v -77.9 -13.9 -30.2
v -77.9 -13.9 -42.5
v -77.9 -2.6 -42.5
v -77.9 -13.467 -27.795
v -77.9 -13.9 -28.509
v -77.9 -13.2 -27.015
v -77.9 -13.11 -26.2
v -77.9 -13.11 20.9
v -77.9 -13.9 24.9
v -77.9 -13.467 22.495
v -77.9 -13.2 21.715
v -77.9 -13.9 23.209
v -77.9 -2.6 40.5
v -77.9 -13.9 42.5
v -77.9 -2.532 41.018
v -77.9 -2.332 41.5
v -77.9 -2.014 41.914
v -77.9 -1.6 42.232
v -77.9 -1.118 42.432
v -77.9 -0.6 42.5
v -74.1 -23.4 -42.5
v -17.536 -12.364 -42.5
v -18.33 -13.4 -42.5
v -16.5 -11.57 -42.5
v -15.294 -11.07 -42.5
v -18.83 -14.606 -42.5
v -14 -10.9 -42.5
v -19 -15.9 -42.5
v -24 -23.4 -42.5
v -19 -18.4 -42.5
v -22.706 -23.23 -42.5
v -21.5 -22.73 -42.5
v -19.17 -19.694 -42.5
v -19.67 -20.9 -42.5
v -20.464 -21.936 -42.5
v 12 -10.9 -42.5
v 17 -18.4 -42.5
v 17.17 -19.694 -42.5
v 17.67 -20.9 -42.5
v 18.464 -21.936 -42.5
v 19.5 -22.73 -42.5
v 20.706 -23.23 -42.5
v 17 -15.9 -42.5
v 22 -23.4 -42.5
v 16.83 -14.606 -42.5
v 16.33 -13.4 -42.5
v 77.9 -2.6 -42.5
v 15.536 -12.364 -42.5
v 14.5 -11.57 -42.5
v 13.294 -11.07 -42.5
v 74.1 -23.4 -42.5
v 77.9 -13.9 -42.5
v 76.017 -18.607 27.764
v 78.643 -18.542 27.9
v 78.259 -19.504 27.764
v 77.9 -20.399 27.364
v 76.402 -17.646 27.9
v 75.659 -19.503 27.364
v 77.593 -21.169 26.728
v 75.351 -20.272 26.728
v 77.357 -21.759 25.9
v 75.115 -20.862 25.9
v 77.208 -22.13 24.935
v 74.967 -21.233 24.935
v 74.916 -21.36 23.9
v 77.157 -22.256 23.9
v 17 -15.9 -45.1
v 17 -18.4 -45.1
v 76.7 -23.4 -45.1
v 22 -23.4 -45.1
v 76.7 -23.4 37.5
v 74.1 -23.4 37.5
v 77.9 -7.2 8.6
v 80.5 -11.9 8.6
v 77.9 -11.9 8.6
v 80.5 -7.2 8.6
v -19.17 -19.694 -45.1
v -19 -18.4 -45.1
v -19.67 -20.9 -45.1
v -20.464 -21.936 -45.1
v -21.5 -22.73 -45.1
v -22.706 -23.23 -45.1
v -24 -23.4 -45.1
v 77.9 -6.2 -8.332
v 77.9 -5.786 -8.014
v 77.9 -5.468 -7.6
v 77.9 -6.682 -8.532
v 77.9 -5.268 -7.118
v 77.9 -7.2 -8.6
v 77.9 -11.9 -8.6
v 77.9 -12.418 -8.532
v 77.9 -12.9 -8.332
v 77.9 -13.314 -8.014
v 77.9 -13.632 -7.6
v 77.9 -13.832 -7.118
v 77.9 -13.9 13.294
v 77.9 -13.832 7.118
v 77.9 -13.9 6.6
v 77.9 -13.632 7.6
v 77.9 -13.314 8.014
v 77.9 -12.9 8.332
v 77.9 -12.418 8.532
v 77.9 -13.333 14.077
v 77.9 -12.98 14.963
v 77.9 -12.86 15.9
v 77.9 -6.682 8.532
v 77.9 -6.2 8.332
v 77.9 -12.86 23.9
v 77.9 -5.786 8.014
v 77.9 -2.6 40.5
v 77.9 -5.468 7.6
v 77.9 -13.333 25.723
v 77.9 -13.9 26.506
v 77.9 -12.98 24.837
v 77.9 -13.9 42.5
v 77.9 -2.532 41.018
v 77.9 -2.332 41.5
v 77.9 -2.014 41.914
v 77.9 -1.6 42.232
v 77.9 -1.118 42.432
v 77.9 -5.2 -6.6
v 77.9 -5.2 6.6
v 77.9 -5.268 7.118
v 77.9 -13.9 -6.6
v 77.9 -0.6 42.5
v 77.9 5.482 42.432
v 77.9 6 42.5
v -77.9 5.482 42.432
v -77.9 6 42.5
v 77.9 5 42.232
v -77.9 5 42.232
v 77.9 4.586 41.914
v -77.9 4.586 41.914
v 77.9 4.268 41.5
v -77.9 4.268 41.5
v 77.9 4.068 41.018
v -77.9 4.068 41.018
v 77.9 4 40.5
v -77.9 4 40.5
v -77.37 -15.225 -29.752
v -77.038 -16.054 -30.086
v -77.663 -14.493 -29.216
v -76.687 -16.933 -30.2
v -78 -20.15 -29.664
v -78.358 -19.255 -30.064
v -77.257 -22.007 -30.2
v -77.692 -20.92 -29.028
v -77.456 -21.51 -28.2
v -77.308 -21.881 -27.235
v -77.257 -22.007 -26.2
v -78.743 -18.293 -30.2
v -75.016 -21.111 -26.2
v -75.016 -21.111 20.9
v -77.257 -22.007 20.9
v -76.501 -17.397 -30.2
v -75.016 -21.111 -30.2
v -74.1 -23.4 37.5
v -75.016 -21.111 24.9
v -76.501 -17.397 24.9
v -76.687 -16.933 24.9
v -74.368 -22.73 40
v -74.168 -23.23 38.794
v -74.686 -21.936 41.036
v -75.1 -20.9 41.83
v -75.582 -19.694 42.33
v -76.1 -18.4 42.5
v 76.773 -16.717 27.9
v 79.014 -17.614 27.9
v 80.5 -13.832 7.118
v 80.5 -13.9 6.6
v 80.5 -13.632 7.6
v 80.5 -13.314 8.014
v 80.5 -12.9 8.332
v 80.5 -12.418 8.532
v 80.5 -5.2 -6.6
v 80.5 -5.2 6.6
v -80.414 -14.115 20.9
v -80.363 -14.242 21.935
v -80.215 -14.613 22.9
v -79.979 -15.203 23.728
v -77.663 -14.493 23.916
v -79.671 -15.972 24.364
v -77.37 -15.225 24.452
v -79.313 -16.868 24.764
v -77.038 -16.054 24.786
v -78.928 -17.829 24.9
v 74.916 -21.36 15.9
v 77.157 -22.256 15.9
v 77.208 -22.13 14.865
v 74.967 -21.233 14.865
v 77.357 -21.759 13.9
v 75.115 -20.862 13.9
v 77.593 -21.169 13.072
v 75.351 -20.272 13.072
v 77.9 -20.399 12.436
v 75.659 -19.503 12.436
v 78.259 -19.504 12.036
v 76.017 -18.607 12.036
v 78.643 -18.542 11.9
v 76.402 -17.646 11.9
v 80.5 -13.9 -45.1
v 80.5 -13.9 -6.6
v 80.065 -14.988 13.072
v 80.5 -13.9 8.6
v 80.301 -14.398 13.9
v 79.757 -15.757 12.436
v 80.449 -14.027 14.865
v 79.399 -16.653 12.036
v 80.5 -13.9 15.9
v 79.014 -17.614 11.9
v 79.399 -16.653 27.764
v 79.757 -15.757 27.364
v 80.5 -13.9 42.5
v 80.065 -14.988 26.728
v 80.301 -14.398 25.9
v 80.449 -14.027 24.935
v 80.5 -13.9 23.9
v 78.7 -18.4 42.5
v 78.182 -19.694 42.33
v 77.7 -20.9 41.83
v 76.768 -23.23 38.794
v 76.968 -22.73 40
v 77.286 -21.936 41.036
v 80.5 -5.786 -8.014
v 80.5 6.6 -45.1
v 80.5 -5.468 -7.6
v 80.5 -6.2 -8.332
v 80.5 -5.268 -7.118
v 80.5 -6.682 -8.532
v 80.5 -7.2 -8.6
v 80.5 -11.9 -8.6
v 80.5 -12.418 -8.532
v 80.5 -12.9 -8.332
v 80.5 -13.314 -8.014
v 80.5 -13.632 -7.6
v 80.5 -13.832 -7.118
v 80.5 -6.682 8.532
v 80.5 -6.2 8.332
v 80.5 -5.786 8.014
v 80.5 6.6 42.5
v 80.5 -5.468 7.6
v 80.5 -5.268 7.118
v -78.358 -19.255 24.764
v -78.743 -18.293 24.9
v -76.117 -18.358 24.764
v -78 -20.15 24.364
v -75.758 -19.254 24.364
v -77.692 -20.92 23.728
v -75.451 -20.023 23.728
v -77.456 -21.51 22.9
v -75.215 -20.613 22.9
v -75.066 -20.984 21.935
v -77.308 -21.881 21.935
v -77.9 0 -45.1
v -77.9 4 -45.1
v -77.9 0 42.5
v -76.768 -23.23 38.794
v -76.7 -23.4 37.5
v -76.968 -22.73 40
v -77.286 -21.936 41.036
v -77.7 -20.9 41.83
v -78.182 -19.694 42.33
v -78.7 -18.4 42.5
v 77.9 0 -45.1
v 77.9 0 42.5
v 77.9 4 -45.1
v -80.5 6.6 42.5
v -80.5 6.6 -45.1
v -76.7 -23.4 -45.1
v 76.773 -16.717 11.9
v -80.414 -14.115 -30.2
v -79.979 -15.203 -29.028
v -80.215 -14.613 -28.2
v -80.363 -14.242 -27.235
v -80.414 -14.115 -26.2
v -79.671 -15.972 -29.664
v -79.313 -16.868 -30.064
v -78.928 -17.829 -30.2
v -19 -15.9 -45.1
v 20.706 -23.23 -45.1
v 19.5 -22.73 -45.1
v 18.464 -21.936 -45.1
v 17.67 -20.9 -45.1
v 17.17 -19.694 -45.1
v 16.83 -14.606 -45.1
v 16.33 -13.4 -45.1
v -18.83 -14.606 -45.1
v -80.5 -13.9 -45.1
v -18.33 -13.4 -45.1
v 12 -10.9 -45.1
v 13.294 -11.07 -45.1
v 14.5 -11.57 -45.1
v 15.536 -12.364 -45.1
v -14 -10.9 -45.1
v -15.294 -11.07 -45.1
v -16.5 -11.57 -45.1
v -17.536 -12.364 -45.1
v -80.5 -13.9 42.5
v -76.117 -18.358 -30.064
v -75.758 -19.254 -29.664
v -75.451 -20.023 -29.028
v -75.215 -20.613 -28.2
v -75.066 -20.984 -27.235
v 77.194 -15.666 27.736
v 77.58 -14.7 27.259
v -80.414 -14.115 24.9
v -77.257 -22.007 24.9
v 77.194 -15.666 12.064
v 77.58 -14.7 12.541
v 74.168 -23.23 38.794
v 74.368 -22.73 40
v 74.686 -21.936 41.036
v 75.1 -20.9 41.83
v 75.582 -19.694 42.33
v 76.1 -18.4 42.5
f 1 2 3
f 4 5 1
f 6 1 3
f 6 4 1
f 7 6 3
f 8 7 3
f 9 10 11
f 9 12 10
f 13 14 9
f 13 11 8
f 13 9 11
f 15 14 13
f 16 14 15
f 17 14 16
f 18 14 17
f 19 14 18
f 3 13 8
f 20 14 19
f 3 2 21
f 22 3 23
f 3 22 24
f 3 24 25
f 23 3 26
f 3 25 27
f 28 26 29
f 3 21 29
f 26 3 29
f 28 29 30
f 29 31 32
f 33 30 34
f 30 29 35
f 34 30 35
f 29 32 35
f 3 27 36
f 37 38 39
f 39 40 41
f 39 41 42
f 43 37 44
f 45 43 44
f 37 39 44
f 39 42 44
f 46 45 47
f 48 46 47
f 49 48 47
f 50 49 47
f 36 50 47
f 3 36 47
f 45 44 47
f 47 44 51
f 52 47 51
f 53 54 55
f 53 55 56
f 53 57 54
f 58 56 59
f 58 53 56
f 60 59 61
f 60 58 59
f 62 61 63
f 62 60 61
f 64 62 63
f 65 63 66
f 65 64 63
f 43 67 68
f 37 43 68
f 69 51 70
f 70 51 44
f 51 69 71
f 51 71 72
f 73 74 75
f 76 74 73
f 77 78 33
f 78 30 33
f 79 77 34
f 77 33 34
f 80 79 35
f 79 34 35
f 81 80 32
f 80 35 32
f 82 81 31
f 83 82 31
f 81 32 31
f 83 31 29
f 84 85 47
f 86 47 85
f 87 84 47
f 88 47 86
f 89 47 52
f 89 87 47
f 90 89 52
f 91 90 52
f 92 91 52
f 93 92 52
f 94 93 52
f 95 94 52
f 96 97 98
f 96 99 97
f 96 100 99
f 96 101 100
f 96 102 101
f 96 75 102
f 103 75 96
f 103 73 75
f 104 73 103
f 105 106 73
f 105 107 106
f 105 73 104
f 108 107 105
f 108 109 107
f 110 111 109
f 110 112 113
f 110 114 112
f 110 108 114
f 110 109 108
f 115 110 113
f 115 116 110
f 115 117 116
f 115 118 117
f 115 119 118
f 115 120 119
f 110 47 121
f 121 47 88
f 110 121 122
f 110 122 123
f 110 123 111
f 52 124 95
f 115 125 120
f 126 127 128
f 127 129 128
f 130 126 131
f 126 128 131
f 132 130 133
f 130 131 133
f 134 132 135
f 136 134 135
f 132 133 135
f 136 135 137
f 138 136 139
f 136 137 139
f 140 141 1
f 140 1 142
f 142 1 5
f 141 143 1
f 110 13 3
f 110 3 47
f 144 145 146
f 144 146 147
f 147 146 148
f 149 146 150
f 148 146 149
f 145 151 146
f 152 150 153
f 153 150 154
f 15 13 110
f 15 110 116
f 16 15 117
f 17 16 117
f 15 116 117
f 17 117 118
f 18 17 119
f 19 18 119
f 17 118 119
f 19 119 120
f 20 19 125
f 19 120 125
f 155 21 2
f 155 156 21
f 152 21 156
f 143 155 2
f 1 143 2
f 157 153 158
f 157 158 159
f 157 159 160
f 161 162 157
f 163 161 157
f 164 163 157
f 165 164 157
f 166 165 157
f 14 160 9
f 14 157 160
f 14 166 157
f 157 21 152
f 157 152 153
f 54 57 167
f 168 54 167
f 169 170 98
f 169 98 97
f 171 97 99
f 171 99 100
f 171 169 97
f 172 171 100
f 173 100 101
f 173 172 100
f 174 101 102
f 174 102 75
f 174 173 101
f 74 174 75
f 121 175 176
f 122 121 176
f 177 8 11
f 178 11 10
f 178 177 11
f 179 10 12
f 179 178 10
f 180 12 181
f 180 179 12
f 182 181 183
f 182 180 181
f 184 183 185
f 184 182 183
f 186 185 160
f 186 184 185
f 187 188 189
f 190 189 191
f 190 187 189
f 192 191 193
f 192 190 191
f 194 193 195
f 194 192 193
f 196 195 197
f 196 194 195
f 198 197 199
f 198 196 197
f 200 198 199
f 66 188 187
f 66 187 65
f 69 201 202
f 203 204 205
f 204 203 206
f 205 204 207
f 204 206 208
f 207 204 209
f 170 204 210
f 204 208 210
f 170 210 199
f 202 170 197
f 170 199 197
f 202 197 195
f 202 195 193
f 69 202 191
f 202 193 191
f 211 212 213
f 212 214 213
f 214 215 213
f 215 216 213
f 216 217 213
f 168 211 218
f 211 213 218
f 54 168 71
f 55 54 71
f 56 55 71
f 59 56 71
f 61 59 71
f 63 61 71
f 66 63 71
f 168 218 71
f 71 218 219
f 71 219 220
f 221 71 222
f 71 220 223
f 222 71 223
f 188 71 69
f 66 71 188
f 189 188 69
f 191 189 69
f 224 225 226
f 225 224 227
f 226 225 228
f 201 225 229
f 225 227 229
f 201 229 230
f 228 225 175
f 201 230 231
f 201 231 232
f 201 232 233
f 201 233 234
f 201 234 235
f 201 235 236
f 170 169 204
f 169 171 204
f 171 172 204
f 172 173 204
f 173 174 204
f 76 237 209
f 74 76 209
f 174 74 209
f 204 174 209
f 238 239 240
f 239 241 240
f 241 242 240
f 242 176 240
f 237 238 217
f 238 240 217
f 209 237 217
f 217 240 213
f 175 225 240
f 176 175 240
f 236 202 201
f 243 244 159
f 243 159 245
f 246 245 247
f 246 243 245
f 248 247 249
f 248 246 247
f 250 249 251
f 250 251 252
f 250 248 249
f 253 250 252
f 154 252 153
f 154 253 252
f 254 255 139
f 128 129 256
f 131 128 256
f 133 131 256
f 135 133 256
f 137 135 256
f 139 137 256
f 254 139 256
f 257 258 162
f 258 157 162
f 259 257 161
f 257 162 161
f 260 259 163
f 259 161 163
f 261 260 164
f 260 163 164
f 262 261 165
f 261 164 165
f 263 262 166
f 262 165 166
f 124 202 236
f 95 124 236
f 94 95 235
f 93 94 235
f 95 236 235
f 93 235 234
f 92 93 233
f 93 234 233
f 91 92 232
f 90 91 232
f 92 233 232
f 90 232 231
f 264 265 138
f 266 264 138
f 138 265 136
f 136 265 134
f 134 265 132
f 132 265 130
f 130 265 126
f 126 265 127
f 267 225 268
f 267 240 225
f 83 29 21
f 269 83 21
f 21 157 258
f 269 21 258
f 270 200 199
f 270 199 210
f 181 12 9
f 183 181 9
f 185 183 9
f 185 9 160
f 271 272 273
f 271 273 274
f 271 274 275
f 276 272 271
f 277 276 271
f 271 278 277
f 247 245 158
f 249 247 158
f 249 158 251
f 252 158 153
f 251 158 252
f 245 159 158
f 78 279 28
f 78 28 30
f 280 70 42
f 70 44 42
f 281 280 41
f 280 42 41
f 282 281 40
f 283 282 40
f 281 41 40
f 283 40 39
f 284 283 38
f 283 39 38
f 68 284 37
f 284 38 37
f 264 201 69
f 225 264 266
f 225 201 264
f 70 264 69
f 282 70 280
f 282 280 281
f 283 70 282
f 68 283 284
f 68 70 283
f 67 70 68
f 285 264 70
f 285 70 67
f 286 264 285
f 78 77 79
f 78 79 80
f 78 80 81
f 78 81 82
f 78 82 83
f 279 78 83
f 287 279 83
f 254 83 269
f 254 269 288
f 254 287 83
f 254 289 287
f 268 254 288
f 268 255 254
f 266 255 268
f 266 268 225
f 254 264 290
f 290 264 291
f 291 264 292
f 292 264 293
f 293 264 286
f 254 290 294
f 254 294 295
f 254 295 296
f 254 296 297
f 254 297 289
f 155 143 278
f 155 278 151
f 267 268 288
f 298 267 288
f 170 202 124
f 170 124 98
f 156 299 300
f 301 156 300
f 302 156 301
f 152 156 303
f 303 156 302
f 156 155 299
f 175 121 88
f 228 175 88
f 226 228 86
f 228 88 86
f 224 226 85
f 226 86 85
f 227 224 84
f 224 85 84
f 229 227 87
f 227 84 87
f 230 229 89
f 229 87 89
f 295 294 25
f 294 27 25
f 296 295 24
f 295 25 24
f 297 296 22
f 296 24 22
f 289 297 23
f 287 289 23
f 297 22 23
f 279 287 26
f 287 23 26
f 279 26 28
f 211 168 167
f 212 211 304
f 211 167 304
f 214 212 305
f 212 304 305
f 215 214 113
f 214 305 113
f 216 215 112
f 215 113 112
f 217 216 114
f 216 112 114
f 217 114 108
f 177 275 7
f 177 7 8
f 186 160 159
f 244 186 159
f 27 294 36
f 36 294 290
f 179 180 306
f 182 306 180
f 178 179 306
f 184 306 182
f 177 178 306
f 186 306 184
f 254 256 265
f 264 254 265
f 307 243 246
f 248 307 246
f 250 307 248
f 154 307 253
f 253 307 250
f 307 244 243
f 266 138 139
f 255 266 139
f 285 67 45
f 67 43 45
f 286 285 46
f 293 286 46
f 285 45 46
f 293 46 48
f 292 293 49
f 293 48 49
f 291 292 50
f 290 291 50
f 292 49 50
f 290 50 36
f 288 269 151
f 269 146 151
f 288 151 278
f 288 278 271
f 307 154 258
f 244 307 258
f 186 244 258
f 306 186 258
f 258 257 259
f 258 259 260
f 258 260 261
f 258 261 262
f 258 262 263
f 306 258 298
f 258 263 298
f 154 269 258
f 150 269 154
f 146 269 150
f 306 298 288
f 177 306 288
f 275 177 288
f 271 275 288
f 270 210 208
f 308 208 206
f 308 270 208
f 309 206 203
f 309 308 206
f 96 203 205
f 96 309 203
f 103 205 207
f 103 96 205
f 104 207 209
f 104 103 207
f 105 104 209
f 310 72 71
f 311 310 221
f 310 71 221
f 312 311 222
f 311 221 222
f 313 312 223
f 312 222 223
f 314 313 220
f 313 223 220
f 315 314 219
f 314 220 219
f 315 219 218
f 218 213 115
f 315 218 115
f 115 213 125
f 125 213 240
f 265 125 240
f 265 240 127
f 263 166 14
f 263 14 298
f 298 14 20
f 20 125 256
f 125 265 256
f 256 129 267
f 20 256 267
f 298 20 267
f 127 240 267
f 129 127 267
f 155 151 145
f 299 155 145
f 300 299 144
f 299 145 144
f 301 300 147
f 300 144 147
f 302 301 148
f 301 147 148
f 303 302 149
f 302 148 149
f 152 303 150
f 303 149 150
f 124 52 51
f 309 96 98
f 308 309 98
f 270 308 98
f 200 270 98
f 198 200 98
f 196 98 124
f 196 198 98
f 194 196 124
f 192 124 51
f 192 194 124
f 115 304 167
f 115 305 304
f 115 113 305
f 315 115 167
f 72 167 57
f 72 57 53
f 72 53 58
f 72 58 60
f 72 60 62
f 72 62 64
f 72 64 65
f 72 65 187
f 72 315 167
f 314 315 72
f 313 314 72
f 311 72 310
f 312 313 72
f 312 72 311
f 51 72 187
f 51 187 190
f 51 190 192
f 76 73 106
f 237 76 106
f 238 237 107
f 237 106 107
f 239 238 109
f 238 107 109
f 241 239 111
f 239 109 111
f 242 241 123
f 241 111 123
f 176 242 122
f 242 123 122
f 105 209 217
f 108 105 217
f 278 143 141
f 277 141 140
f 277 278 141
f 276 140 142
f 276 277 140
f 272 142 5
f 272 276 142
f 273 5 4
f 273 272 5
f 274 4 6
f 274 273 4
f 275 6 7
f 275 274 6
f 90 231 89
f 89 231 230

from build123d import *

# Parameters (mm, degrees)
F0_W          = 155.8
F0_H          = 85
F1_DEPTH      = 2.6
F3_DEPTH      = 85
F5_DEPTH      = 2.6
F6_W          = 8.7
F6_H          = 17.2
F7_DEPTH      = 25
F8_W          = 9
F8_H          = 16
F9_DEPTH      = 25
F10_W         = 8.5
F10_H         = 55.1
F11_DEPTH     = 25
F12_W         = 6.6
F12_H         = 87.6
F13_DEPTH     = 2.6
F14_W         = 6.6
F14_H         = 87.6
F15_DEPTH     = 2.6
F16_W         = 155.8
F16_H         = 87.6
F17_DEPTH     = 2.6
F19_W         = 36
F19_H         = 12.5
F20_DEPTH     = 25
F21_T1_DEPTH  = 2.4140393963
F21_T6_DEPTH  = 12.7075604463
F21_T12_DEPTH = 12.7075604463
F21_T18_DEPTH = 12.7075604463
F21_T24_DEPTH = 12.7075604463
F21_T30_DEPTH = 12.7075604463
F21_T36_DEPTH = 12.7075604463
F22_R         = 4
F23_T1_DEPTH  = 2.6
F23_T6_DEPTH  = 2.6
F23_T12_DEPTH = 2.6
F23_T17_DEPTH = 2.6
F23_T23_DEPTH = 2.6
F24_R         = 5
F25_R         = 2
F26_R         = 5


# Not quite as in the source:
# - a fillet or chamfer that OpenCascade refuses, or shapes differently, is made with other operations: its cross-section is extruded or revolved along the edge and cut away or added


with BuildPart() as f1:
    # F0 (on Front) → F1 (new body)
    with BuildSketch(Plane.XZ):
        Rectangle(F0_W, F0_H)
    extrude(amount=F1_DEPTH)

    # F2 (on face) → F3 (join)
    with BuildSketch(Plane.XY.offset(42.5)):
        Polygon((-77.9, -13.9), (-77.9, -2.6), (-77.9, 0), (-80.5, 0), (-80.5, -13.9), align=None)
        Polygon((-74.1, -23.4), (-77.9, -13.9), (-80.5, -13.9), (-76.7, -23.4), align=None)
        Polygon((77.9, 0), (77.9, -2.6), (77.9, -13.9), (74.1, -23.4), (76.7, -23.4), (80.5, -13.9), (80.5, 0), align=None)
    extrude(amount=-F3_DEPTH)

    # F4 (on face) → F5 (join)
    with BuildSketch(Plane(origin=(0, 0, -42.5), x_dir=(1, 0, 0), z_dir=(0, 0, -1))):
        Polygon((74.1, 23.4), (-74.1, 23.4), (-77.9, 13.9), (-77.9, 2.6), (77.9, 2.6), (77.9, 13.9), align=None)
        Polygon((-77.9, 13.9), (-74.1, 23.4), (-76.7, 23.4), (-80.5, 13.9), (-80.5, 0), (80.5, 0), (80.5, 13.9), (76.7, 23.4), (74.1, 23.4), (77.9, 13.9), (77.9, 2.6), (-77.9, 2.6), align=None)
    extrude(amount=F5_DEPTH)

    # F6 (on face) → F7 (cut)
    with BuildSketch(Plane.YZ.offset(80.5)):
        with Locations((-9.55, 0)):
            Rectangle(F6_W, F6_H)
    extrude(amount=-F7_DEPTH, mode=Mode.SUBTRACT)

    # F8 (on face) → F9 (cut)
    with BuildSketch(Plane(origin=(74.1896551724, -29.675862069, 0), x_dir=(0.3713906764, 0.9284766909, 0), z_dir=(0.9284766909, -0.3713906764, 0))):
        with Locations((12.4911234432, 19.9)):
            Rectangle(F8_W, F8_H)
    extrude(amount=-F9_DEPTH, mode=Mode.SUBTRACT)

    # F10 (on face) → F11 (cut)
    with BuildSketch(Plane(origin=(-74.1896551724, -29.675862069, 0), x_dir=(0.3713906764, -0.9284766909, 0), z_dir=(-0.9284766909, -0.3713906764, 0))):
        with Locations((-12.5093103096, -2.65)):
            Rectangle(F10_W, F10_H)
    extrude(amount=-F11_DEPTH, mode=Mode.SUBTRACT)

    # F12 (on face) → F13 (join)
    with BuildSketch(Plane(origin=(-80.5, 0, 0), x_dir=(0, -1, 0), z_dir=(-1, 0, 0))):
        with Locations((-3.3, -1.3)):
            Rectangle(F12_W, F12_H)
    extrude(amount=-F13_DEPTH)

    # F14 (on face) → F15 (join)
    with BuildSketch(Plane.YZ.offset(80.5)):
        with Locations((3.3, -1.3)):
            Rectangle(F14_W, F14_H)
    extrude(amount=-F15_DEPTH)

    # F16 (on face) → F17 (join)
    with BuildSketch(Plane(origin=(0, 6.6, 0), x_dir=(-1, 0, 0), z_dir=(0, 1, 0))):
        with Locations((0, -1.3)):
            Rectangle(F16_W, F16_H)
    extrude(amount=-F17_DEPTH)

    # F18: union 

    # F19 (on face) → F20 (cut)
    with BuildSketch(Plane(origin=(0, 0, -45.1), x_dir=(1, 0, 0), z_dir=(0, 0, -1))):
        with Locations((-1, 17.15)):
            Rectangle(F19_W, F19_H)
    extrude(amount=-F20_DEPTH, mode=Mode.SUBTRACT)

    # F21: fillet of radius 4 on 4 edges, made by hand

    # F21_s2 → F21_t1 (join)
    with BuildSketch(Plane(origin=(-74.1896551724, -29.675862069, 0), x_dir=(0, 0, 1), z_dir=(0.9284766909, 0.3713906764, 0))):
        with BuildLine():
            ThreePointArc((-30.2, -12.2593103096), (-29.0284271247, -9.4308831849), (-26.2, -8.2593103096))
            Line((-26.2, -8.2593103096), (-30.2, -8.2593103096))
            Line((-30.2, -8.2593103096), (-30.2, -12.2593103096))
        make_face()
        with BuildLine():
            ThreePointArc((24.9, -12.2593103096), (23.7284271247, -9.4308831849), (20.9, -8.2593103096))
            Line((20.9, -8.2593103096), (24.9, -8.2593103096))
            Line((24.9, -8.2593103096), (24.9, -12.2593103096))
        make_face()
    extrude(amount=F21_T1_DEPTH)


with BuildPart() as f21_tool4:
    # F21_s5 → F21_t6 (new body)
    with BuildSketch(Plane(origin=(-74.1896551724, -29.675862069, 0), x_dir=(0, 0, 1), z_dir=(0.9284766909, 0.3713906764, 0))):
        with BuildLine():
            ThreePointArc((-30.2, -12.7593103096), (-29.0284271247, -15.5877374344), (-26.2, -16.7593103096))
            Line((-26.2, -16.7593103096), (-30.2, -16.7593103096))
            Line((-30.2, -16.7593103096), (-30.2, -12.7593103096))
        make_face()
    extrude(amount=F21_T6_DEPTH)

    split(bisect_by=Plane.YZ.offset(-77.9), keep=Keep.BOTTOM)

    split(bisect_by=Plane(origin=(-71.9482758621, -28.7793103448, 0), x_dir=(0, 0, 1), z_dir=(-0.9284766909, -0.3713906764, 0)), keep=Keep.TOP)


with BuildPart() as f1_1:
    add(f1.part)

    # F21_t3: union F21_tool4
    add(f21_tool4.part)


with BuildPart() as f21_tool10:
    # F21_s11 → F21_t12 (new body)
    with BuildSketch(Plane(origin=(-74.1896551724, -29.675862069, 0), x_dir=(0, 0, 1), z_dir=(0.9284766909, 0.3713906764, 0))):
        with BuildLine():
            ThreePointArc((-30.2, -12.7593103096), (-29.0284271247, -15.5877374344), (-26.2, -16.7593103096))
            Line((-26.2, -16.7593103096), (-30.2, -16.7593103096))
            Line((-30.2, -16.7593103096), (-30.2, -12.7593103096))
        make_face()
    extrude(amount=F21_T12_DEPTH)

    split(bisect_by=Plane.YZ.offset(-77.9), keep=Keep.BOTTOM)

    split(bisect_by=Plane(origin=(-71.9482758621, -28.7793103448, 0), x_dir=(0, 0, 1), z_dir=(0.9284766909, 0.3713906764, 0)), keep=Keep.TOP)


with BuildPart() as f1_2:
    add(f1_1.part)

    # F21_t9: union F21_tool10
    add(f21_tool10.part)


with BuildPart() as f21_tool16:
    # F21_s17 → F21_t18 (new body)
    with BuildSketch(Plane(origin=(-74.1896551724, -29.675862069, 0), x_dir=(0, 0, 1), z_dir=(0.9284766909, 0.3713906764, 0))):
        with BuildLine():
            ThreePointArc((-30.2, -12.7593103096), (-29.0284271247, -15.5877374344), (-26.2, -16.7593103096))
            Line((-26.2, -16.7593103096), (-30.2, -16.7593103096))
            Line((-30.2, -16.7593103096), (-30.2, -12.7593103096))
        make_face()
    extrude(amount=F21_T18_DEPTH)

    split(bisect_by=Plane.YZ.offset(-77.9), keep=Keep.TOP)

    split(bisect_by=Plane(origin=(-71.9482758621, -28.7793103448, 0), x_dir=(0, 0, 1), z_dir=(-0.9284766909, -0.3713906764, 0)), keep=Keep.TOP)


with BuildPart() as f1_3:
    add(f1_2.part)

    # F21_t15: union F21_tool16
    add(f21_tool16.part)


with BuildPart() as f21_tool22:
    # F21_s23 → F21_t24 (new body)
    with BuildSketch(Plane(origin=(-74.1896551724, -29.675862069, 0), x_dir=(0, 0, 1), z_dir=(0.9284766909, 0.3713906764, 0))):
        with BuildLine():
            ThreePointArc((20.9, -16.7593103096), (23.7284271247, -15.5877374344), (24.9, -12.7593103096))
            Line((24.9, -12.7593103096), (24.9, -16.7593103096))
            Line((24.9, -16.7593103096), (20.9, -16.7593103096))
        make_face()
    extrude(amount=F21_T24_DEPTH)

    split(bisect_by=Plane.YZ.offset(-77.9), keep=Keep.BOTTOM)

    split(bisect_by=Plane(origin=(-71.9482758621, -28.7793103448, 0), x_dir=(0, 0, 1), z_dir=(-0.9284766909, -0.3713906764, 0)), keep=Keep.TOP)


with BuildPart() as f1_4:
    add(f1_3.part)

    # F21_t21: union F21_tool22
    add(f21_tool22.part)


with BuildPart() as f21_tool28:
    # F21_s29 → F21_t30 (new body)
    with BuildSketch(Plane(origin=(-74.1896551724, -29.675862069, 0), x_dir=(0, 0, 1), z_dir=(0.9284766909, 0.3713906764, 0))):
        with BuildLine():
            ThreePointArc((20.9, -16.7593103096), (23.7284271247, -15.5877374344), (24.9, -12.7593103096))
            Line((24.9, -12.7593103096), (24.9, -16.7593103096))
            Line((24.9, -16.7593103096), (20.9, -16.7593103096))
        make_face()
    extrude(amount=F21_T30_DEPTH)

    split(bisect_by=Plane.YZ.offset(-77.9), keep=Keep.TOP)

    split(bisect_by=Plane(origin=(-71.9482758621, -28.7793103448, 0), x_dir=(0, 0, 1), z_dir=(-0.9284766909, -0.3713906764, 0)), keep=Keep.TOP)


with BuildPart() as f1_5:
    add(f1_4.part)

    # F21_t27: union F21_tool28
    add(f21_tool28.part)


with BuildPart() as f21_tool34:
    # F21_s35 → F21_t36 (new body)
    with BuildSketch(Plane(origin=(-74.1896551724, -29.675862069, 0), x_dir=(0, 0, 1), z_dir=(0.9284766909, 0.3713906764, 0))):
        with BuildLine():
            ThreePointArc((20.9, -16.7593103096), (23.7284271247, -15.5877374344), (24.9, -12.7593103096))
            Line((24.9, -12.7593103096), (24.9, -16.7593103096))
            Line((24.9, -16.7593103096), (20.9, -16.7593103096))
        make_face()
    extrude(amount=F21_T36_DEPTH)

    split(bisect_by=Plane.YZ.offset(-77.9), keep=Keep.BOTTOM)

    split(bisect_by=Plane(origin=(-71.9482758621, -28.7793103448, 0), x_dir=(0, 0, 1), z_dir=(0.9284766909, 0.3713906764, 0)), keep=Keep.TOP)


with BuildPart() as f1_6:
    add(f1_5.part)

    # F21_t33: union F21_tool34
    add(f21_tool34.part)

    # F22 (call 1 of 4: OpenCascade refuses the feature's edges together)
    f22_edges = [f1_6.edges().sort_by_distance(p)[0] for p in [
        (76.036794, -21.808014, 11.9),
    ]]
    fillet(f22_edges, radius=F22_R)

    # F22#2 (call 2 of 4)
    f22_2_edges = [f1_6.edges().sort_by_distance(p)[0] for p in [
        (79.2, -13.38, 11.9),
    ]]
    fillet(f22_2_edges, radius=F22_R)

    # F22#3 (call 3 of 4)
    f22_3_edges = [f1_6.edges().sort_by_distance(p)[0] for p in [
        (76.036794, -21.808014, 27.9),
    ]]
    fillet(f22_3_edges, radius=F22_R)

    # F22#4 (call 4 of 4)
    f22_4_edges = [f1_6.edges().sort_by_distance(p)[0] for p in [
        (79.2, -13.38, 27.9),
    ]]
    fillet(f22_4_edges, radius=F22_R)

    # F23: fillet of radius 2 on 4 edges, made by hand

    # F23_s2 → F23_t1 (join)
    with BuildSketch(Plane.YZ.offset(77.9)):
        with BuildLine():
            ThreePointArc((-7.2, 8.6), (-5.7857864376, 8.0142135624), (-5.2, 6.6))
            Line((-5.2, 6.6), (-5.2, 8.6))
            Line((-5.2, 8.6), (-7.2, 8.6))
        make_face()
        with BuildLine():
            ThreePointArc((-5.2, -6.6), (-5.7857864376, -8.0142135624), (-7.2, -8.6))
            Line((-7.2, -8.6), (-5.2, -8.6))
            Line((-5.2, -8.6), (-5.2, -6.6))
        make_face()
    extrude(amount=F23_T1_DEPTH)


with BuildPart() as f23_tool4:
    # F23_s5 → F23_t6 (new body)
    with BuildSketch(Plane.YZ.offset(80.5)):
        with BuildLine():
            ThreePointArc((-13.9, 6.6), (-13.3142135624, 8.0142135624), (-11.9, 8.6))
            Line((-11.9, 8.6), (-13.9, 8.6))
            Line((-13.9, 8.6), (-13.9, 6.6))
        make_face()
    extrude(amount=-F23_T6_DEPTH)

    split(bisect_by=Plane(origin=(74.1896551724, -29.675862069, 0), x_dir=(0, 0, 1), z_dir=(-0.9284766909, 0.3713906764, 0)), keep=Keep.TOP)

    split(bisect_by=Plane(origin=(71.9482758621, -28.7793103448, 0), x_dir=(0, 0, 1), z_dir=(0.9284766909, -0.3713906764, 0)), keep=Keep.TOP)


with BuildPart() as f1_7:
    add(f1_6.part)

    # F23_t3: union F23_tool4
    add(f23_tool4.part)


with BuildPart() as f23_tool10:
    # F23_s11 → F23_t12 (new body)
    with BuildSketch(Plane.YZ.offset(80.5)):
        with BuildLine():
            ThreePointArc((-13.9, 6.6), (-13.3142135624, 8.0142135624), (-11.9, 8.6))
            Line((-11.9, 8.6), (-13.9, 8.6))
            Line((-13.9, 8.6), (-13.9, 6.6))
        make_face()
    extrude(amount=-F23_T12_DEPTH)

    split(bisect_by=Plane(origin=(71.9482758621, -28.7793103448, 0), x_dir=(0, 0, 1), z_dir=(-0.9284766909, 0.3713906764, 0)), keep=Keep.TOP)


with BuildPart() as f1_8:
    add(f1_7.part)

    # F23_t9: union F23_tool10
    add(f23_tool10.part)


with BuildPart() as f23_tool15:
    # F23_s16 → F23_t17 (new body)
    with BuildSketch(Plane.YZ.offset(80.5)):
        with BuildLine():
            ThreePointArc((-13.9, -6.6), (-13.3142135624, -8.0142135624), (-11.9, -8.6))
            Line((-11.9, -8.6), (-13.9, -8.6))
            Line((-13.9, -8.6), (-13.9, -6.6))
        make_face()
    extrude(amount=-F23_T17_DEPTH)

    split(bisect_by=Plane(origin=(74.1896551724, -29.675862069, 0), x_dir=(0, 0, 1), z_dir=(-0.9284766909, 0.3713906764, 0)), keep=Keep.TOP)

    split(bisect_by=Plane(origin=(71.9482758621, -28.7793103448, 0), x_dir=(0, 0, 1), z_dir=(0.9284766909, -0.3713906764, 0)), keep=Keep.TOP)


with BuildPart() as f1_9:
    add(f1_8.part)

    # F23_t14: union F23_tool15
    add(f23_tool15.part)


with BuildPart() as f23_tool21:
    # F23_s22 → F23_t23 (new body)
    with BuildSketch(Plane.YZ.offset(80.5)):
        with BuildLine():
            ThreePointArc((-13.9, -6.6), (-13.3142135624, -8.0142135624), (-11.9, -8.6))
            Line((-11.9, -8.6), (-13.9, -8.6))
            Line((-13.9, -8.6), (-13.9, -6.6))
        make_face()
    extrude(amount=-F23_T23_DEPTH)

    split(bisect_by=Plane(origin=(71.9482758621, -28.7793103448, 0), x_dir=(0, 0, 1), z_dir=(-0.9284766909, 0.3713906764, 0)), keep=Keep.TOP)


with BuildPart() as f1_10:
    add(f1_9.part)

    # F23_t20: union F23_tool21
    add(f23_tool21.part)

    # F24
    f24_edges = [f1_10.edges().sort_by_distance(p)[0] for p in [
        (17, -10.9, -43.8),
        (-19, -10.9, -43.8),
        (17, -23.4, -43.8),
        (-19, -23.4, -43.8),
    ]]
    fillet(f24_edges, radius=F24_R)

    # F25
    f25_edges = [f1_10.edges().sort_by_distance(p)[0] for p in [
        (0, -2.6, 42.5),
        (0, 4, 42.5),
    ]]
    fillet(f25_edges, radius=F25_R)

    # F26
    f26_edges = [f1_10.edges().sort_by_distance(p)[0] for p in [
        (-75.4, -23.4, 42.5),
        (75.4, -23.4, 42.5),
    ]]
    fillet(f26_edges, radius=F26_R)


solid = f1_10.part
